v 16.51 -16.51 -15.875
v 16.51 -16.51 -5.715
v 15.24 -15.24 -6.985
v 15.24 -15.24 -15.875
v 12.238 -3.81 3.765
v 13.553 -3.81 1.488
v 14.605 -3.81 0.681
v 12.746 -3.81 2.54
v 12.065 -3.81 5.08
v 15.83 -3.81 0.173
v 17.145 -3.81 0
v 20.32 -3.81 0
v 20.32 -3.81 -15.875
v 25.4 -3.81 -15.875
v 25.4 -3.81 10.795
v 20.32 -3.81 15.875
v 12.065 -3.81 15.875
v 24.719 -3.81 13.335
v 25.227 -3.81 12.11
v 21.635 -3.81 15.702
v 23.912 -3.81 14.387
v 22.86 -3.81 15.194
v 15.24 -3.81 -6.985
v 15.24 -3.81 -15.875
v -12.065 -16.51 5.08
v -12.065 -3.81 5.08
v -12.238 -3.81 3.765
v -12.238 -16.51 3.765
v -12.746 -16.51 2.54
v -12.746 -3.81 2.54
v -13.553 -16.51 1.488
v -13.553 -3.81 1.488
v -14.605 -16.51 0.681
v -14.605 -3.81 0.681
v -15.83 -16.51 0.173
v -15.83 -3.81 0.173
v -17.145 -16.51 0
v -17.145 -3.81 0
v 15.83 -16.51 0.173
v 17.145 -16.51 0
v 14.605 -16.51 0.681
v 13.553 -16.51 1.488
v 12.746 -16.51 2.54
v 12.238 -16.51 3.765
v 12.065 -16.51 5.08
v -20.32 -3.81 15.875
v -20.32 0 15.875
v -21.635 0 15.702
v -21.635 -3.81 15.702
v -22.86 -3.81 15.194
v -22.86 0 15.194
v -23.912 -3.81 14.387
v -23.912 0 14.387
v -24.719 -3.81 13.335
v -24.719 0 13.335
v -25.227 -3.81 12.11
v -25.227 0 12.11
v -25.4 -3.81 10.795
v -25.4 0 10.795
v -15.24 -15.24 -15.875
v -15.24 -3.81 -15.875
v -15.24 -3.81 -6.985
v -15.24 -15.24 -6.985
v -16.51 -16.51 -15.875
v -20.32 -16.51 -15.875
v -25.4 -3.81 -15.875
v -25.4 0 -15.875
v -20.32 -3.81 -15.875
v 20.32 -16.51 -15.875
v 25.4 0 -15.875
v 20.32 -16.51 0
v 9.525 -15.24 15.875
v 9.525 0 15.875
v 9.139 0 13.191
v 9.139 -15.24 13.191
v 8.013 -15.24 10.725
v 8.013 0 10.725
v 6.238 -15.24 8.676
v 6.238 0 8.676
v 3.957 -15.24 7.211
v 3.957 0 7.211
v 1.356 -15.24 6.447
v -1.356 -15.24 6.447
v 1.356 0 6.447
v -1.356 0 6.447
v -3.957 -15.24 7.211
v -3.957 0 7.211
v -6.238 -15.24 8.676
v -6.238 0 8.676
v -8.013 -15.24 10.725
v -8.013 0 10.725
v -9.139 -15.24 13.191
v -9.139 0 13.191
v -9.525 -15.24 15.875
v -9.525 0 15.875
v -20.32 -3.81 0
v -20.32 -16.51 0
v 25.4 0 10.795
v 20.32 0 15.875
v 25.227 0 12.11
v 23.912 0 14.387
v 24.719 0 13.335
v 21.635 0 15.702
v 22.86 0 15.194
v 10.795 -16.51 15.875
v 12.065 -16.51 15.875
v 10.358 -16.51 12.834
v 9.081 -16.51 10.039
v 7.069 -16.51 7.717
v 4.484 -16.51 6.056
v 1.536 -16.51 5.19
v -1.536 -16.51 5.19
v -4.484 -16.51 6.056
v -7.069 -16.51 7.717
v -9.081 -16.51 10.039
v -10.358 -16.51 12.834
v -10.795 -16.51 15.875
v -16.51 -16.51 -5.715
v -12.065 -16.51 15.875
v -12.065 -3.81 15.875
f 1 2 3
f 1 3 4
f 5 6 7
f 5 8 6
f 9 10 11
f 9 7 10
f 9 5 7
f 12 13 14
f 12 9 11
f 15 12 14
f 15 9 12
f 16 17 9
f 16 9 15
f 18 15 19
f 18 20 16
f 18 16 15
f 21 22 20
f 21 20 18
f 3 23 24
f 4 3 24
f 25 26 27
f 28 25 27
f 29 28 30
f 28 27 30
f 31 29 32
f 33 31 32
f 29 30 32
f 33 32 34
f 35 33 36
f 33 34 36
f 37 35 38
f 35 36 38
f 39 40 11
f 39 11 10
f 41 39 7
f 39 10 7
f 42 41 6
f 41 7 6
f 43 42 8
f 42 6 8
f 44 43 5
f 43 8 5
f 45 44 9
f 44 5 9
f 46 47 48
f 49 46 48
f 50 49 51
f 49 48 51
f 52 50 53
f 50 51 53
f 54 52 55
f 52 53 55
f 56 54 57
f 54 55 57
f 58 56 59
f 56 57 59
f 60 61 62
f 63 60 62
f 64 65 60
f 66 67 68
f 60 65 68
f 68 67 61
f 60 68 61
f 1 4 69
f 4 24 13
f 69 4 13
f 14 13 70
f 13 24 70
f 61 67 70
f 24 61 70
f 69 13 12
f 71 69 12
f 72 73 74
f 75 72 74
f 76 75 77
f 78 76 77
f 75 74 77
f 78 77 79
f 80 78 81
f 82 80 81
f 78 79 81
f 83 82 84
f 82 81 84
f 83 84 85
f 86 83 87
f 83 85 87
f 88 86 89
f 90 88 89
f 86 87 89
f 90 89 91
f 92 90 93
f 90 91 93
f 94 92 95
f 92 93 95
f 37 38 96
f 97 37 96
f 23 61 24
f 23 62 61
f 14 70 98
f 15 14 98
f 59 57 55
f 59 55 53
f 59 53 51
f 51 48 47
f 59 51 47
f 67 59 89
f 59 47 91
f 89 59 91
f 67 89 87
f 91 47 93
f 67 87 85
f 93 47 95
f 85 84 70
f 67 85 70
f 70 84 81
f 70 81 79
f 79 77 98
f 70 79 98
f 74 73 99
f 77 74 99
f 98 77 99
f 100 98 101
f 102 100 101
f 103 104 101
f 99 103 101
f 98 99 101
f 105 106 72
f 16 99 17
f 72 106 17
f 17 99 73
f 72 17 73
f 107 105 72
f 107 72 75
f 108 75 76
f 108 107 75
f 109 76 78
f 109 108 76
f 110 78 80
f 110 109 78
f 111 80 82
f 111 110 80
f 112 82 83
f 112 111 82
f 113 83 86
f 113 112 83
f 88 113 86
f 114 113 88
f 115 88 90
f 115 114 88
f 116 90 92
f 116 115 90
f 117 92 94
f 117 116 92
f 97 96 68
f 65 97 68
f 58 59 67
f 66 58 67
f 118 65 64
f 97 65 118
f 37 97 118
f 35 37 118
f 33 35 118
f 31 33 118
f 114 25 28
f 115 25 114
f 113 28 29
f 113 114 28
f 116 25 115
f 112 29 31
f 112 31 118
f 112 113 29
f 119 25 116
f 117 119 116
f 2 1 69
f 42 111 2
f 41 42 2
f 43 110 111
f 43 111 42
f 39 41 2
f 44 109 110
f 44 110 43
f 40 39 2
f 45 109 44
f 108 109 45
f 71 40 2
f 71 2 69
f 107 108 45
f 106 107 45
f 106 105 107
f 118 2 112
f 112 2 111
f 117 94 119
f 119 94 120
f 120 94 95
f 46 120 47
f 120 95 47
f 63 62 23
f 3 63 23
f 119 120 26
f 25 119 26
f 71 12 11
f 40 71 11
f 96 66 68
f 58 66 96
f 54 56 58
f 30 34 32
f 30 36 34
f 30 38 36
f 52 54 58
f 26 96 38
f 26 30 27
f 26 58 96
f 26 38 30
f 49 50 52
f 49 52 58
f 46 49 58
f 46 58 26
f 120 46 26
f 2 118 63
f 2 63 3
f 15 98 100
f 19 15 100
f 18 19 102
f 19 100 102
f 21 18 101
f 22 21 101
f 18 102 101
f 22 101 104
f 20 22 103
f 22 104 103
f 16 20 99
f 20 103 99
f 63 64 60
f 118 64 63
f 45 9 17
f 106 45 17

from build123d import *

# Parameters (mm, degrees)
F1_DEPTH = 3.81
F3_DEPTH = 12.7
F4_SIZE  = 1.27


with BuildPart() as f1:
    # F0 (on Front) → F1 (new body)
    with BuildSketch(Plane.XZ):
        with BuildLine():
            ThreePointArc((25.4, 10.795), (23.912102, 14.387102), (20.32, 15.875))
            Line((20.32, 15.875), (9.525, 15.875))
            ThreePointArc((9.525, 15.875), (0, 6.35), (-9.525, 15.875))
            Line((-9.525, 15.875), (-20.32, 15.875))
            ThreePointArc((-20.32, 15.875), (-23.912102, 14.387102), (-25.4, 10.795))
            Line((-25.4, 10.795), (-25.4, -15.875))
            Line((-25.4, -15.875), (25.4, -15.875))
            Line((25.4, -15.875), (25.4, 10.795))
        make_face()
    extrude(amount=F1_DEPTH)

    # F2 (on face) → F3 (join)
    with BuildSketch(Plane.XZ.offset(3.81)):
        with BuildLine():
            ThreePointArc((9.525, 15.875), (0, 6.35), (-9.525, 15.875))
            Line((-9.525, 15.875), (-12.065, 15.875))
            Line((-12.065, 15.875), (-12.065, 5.08))
            ThreePointArc((-12.065, 5.08), (-13.552898, 1.487898), (-17.145, 0))
            Line((-17.145, 0), (-20.32, 0))
            Line((-20.32, 0), (-20.32, -15.875))
            Line((-20.32, -15.875), (-15.24, -15.875))
            Line((-15.24, -15.875), (-15.24, -6.985))
            Line((-15.24, -6.985), (0, -6.985))
            Line((0, -6.985), (15.24, -6.985))
            Line((15.24, -6.985), (15.24, -15.875))
            Line((15.24, -15.875), (20.32, -15.875))
            Line((20.32, -15.875), (20.32, 0))
            Line((20.32, 0), (17.145, 0))
            ThreePointArc((17.145, 0), (13.552898, 1.487898), (12.065, 5.08))
            Line((12.065, 5.08), (12.065, 15.875))
            Line((12.065, 15.875), (9.525, 15.875))
        make_face()
    extrude(amount=F3_DEPTH)

    # F4
    f4_edges = [f1.edges().sort_by_distance(p)[0] for p in [
        (0, -16.51, 6.35),
        (-15.24, -16.51, -11.43),
        (0, -16.51, -6.985),
        (15.24, -16.51, -11.43),
    ]]
    chamfer(f4_edges, length=F4_SIZE)


solid = f1.part
